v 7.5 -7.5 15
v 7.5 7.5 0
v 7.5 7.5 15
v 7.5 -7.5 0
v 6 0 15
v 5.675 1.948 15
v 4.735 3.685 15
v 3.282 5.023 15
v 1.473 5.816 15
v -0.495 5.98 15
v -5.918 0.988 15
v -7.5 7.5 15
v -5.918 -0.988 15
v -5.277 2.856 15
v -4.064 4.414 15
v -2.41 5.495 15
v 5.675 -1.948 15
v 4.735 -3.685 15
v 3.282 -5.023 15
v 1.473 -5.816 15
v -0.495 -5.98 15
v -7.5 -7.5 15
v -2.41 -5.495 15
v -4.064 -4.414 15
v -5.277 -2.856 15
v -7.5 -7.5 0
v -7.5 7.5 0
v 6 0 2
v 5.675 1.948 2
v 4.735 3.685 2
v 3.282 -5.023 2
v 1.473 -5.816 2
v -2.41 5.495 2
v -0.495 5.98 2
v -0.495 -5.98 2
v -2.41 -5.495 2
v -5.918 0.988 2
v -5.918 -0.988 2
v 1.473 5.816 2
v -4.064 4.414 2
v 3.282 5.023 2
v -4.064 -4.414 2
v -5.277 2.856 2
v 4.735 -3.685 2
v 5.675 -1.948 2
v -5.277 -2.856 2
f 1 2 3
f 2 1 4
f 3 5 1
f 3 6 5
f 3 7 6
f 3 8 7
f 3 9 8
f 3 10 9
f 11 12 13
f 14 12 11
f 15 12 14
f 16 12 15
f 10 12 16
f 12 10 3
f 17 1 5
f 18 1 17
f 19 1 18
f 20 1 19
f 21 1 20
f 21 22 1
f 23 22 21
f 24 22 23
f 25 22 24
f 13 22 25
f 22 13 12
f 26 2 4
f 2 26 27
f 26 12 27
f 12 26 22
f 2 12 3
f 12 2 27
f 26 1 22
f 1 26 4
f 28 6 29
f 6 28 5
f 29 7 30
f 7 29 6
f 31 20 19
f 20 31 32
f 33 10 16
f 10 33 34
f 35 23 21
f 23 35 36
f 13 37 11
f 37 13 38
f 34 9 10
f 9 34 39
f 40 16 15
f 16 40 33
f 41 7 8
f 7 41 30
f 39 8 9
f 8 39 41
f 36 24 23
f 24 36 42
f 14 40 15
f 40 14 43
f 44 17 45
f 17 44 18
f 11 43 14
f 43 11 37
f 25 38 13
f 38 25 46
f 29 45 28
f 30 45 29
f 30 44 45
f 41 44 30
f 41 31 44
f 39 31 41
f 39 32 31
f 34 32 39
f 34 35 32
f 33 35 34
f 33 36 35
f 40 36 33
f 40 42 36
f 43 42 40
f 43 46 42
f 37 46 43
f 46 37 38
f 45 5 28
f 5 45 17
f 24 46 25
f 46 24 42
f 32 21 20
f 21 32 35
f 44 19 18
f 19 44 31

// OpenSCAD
SINGLE_CUBE_WIDTH = 15;

module HoledCube() {
    step_width = SINGLE_CUBE_WIDTH;
    step_depth = SINGLE_CUBE_WIDTH;
    step_height = SINGLE_CUBE_WIDTH;

    difference() {
        translate([0,0, step_height/2]){
            cube([step_width, step_depth, step_height], center = true);
        }
        translate([0, 0, 2]) {
            cylinder(step_height*2, 6, 6);
        }
    }
}

 HoledCube();

// single row 
/*
cubes_per_row = 5;
for(i=[0: cubes_per_row]) {
    translate([i*SINGLE_CUBE_WIDTH,0,0]){
        HoledCube();
    }   
}*/
